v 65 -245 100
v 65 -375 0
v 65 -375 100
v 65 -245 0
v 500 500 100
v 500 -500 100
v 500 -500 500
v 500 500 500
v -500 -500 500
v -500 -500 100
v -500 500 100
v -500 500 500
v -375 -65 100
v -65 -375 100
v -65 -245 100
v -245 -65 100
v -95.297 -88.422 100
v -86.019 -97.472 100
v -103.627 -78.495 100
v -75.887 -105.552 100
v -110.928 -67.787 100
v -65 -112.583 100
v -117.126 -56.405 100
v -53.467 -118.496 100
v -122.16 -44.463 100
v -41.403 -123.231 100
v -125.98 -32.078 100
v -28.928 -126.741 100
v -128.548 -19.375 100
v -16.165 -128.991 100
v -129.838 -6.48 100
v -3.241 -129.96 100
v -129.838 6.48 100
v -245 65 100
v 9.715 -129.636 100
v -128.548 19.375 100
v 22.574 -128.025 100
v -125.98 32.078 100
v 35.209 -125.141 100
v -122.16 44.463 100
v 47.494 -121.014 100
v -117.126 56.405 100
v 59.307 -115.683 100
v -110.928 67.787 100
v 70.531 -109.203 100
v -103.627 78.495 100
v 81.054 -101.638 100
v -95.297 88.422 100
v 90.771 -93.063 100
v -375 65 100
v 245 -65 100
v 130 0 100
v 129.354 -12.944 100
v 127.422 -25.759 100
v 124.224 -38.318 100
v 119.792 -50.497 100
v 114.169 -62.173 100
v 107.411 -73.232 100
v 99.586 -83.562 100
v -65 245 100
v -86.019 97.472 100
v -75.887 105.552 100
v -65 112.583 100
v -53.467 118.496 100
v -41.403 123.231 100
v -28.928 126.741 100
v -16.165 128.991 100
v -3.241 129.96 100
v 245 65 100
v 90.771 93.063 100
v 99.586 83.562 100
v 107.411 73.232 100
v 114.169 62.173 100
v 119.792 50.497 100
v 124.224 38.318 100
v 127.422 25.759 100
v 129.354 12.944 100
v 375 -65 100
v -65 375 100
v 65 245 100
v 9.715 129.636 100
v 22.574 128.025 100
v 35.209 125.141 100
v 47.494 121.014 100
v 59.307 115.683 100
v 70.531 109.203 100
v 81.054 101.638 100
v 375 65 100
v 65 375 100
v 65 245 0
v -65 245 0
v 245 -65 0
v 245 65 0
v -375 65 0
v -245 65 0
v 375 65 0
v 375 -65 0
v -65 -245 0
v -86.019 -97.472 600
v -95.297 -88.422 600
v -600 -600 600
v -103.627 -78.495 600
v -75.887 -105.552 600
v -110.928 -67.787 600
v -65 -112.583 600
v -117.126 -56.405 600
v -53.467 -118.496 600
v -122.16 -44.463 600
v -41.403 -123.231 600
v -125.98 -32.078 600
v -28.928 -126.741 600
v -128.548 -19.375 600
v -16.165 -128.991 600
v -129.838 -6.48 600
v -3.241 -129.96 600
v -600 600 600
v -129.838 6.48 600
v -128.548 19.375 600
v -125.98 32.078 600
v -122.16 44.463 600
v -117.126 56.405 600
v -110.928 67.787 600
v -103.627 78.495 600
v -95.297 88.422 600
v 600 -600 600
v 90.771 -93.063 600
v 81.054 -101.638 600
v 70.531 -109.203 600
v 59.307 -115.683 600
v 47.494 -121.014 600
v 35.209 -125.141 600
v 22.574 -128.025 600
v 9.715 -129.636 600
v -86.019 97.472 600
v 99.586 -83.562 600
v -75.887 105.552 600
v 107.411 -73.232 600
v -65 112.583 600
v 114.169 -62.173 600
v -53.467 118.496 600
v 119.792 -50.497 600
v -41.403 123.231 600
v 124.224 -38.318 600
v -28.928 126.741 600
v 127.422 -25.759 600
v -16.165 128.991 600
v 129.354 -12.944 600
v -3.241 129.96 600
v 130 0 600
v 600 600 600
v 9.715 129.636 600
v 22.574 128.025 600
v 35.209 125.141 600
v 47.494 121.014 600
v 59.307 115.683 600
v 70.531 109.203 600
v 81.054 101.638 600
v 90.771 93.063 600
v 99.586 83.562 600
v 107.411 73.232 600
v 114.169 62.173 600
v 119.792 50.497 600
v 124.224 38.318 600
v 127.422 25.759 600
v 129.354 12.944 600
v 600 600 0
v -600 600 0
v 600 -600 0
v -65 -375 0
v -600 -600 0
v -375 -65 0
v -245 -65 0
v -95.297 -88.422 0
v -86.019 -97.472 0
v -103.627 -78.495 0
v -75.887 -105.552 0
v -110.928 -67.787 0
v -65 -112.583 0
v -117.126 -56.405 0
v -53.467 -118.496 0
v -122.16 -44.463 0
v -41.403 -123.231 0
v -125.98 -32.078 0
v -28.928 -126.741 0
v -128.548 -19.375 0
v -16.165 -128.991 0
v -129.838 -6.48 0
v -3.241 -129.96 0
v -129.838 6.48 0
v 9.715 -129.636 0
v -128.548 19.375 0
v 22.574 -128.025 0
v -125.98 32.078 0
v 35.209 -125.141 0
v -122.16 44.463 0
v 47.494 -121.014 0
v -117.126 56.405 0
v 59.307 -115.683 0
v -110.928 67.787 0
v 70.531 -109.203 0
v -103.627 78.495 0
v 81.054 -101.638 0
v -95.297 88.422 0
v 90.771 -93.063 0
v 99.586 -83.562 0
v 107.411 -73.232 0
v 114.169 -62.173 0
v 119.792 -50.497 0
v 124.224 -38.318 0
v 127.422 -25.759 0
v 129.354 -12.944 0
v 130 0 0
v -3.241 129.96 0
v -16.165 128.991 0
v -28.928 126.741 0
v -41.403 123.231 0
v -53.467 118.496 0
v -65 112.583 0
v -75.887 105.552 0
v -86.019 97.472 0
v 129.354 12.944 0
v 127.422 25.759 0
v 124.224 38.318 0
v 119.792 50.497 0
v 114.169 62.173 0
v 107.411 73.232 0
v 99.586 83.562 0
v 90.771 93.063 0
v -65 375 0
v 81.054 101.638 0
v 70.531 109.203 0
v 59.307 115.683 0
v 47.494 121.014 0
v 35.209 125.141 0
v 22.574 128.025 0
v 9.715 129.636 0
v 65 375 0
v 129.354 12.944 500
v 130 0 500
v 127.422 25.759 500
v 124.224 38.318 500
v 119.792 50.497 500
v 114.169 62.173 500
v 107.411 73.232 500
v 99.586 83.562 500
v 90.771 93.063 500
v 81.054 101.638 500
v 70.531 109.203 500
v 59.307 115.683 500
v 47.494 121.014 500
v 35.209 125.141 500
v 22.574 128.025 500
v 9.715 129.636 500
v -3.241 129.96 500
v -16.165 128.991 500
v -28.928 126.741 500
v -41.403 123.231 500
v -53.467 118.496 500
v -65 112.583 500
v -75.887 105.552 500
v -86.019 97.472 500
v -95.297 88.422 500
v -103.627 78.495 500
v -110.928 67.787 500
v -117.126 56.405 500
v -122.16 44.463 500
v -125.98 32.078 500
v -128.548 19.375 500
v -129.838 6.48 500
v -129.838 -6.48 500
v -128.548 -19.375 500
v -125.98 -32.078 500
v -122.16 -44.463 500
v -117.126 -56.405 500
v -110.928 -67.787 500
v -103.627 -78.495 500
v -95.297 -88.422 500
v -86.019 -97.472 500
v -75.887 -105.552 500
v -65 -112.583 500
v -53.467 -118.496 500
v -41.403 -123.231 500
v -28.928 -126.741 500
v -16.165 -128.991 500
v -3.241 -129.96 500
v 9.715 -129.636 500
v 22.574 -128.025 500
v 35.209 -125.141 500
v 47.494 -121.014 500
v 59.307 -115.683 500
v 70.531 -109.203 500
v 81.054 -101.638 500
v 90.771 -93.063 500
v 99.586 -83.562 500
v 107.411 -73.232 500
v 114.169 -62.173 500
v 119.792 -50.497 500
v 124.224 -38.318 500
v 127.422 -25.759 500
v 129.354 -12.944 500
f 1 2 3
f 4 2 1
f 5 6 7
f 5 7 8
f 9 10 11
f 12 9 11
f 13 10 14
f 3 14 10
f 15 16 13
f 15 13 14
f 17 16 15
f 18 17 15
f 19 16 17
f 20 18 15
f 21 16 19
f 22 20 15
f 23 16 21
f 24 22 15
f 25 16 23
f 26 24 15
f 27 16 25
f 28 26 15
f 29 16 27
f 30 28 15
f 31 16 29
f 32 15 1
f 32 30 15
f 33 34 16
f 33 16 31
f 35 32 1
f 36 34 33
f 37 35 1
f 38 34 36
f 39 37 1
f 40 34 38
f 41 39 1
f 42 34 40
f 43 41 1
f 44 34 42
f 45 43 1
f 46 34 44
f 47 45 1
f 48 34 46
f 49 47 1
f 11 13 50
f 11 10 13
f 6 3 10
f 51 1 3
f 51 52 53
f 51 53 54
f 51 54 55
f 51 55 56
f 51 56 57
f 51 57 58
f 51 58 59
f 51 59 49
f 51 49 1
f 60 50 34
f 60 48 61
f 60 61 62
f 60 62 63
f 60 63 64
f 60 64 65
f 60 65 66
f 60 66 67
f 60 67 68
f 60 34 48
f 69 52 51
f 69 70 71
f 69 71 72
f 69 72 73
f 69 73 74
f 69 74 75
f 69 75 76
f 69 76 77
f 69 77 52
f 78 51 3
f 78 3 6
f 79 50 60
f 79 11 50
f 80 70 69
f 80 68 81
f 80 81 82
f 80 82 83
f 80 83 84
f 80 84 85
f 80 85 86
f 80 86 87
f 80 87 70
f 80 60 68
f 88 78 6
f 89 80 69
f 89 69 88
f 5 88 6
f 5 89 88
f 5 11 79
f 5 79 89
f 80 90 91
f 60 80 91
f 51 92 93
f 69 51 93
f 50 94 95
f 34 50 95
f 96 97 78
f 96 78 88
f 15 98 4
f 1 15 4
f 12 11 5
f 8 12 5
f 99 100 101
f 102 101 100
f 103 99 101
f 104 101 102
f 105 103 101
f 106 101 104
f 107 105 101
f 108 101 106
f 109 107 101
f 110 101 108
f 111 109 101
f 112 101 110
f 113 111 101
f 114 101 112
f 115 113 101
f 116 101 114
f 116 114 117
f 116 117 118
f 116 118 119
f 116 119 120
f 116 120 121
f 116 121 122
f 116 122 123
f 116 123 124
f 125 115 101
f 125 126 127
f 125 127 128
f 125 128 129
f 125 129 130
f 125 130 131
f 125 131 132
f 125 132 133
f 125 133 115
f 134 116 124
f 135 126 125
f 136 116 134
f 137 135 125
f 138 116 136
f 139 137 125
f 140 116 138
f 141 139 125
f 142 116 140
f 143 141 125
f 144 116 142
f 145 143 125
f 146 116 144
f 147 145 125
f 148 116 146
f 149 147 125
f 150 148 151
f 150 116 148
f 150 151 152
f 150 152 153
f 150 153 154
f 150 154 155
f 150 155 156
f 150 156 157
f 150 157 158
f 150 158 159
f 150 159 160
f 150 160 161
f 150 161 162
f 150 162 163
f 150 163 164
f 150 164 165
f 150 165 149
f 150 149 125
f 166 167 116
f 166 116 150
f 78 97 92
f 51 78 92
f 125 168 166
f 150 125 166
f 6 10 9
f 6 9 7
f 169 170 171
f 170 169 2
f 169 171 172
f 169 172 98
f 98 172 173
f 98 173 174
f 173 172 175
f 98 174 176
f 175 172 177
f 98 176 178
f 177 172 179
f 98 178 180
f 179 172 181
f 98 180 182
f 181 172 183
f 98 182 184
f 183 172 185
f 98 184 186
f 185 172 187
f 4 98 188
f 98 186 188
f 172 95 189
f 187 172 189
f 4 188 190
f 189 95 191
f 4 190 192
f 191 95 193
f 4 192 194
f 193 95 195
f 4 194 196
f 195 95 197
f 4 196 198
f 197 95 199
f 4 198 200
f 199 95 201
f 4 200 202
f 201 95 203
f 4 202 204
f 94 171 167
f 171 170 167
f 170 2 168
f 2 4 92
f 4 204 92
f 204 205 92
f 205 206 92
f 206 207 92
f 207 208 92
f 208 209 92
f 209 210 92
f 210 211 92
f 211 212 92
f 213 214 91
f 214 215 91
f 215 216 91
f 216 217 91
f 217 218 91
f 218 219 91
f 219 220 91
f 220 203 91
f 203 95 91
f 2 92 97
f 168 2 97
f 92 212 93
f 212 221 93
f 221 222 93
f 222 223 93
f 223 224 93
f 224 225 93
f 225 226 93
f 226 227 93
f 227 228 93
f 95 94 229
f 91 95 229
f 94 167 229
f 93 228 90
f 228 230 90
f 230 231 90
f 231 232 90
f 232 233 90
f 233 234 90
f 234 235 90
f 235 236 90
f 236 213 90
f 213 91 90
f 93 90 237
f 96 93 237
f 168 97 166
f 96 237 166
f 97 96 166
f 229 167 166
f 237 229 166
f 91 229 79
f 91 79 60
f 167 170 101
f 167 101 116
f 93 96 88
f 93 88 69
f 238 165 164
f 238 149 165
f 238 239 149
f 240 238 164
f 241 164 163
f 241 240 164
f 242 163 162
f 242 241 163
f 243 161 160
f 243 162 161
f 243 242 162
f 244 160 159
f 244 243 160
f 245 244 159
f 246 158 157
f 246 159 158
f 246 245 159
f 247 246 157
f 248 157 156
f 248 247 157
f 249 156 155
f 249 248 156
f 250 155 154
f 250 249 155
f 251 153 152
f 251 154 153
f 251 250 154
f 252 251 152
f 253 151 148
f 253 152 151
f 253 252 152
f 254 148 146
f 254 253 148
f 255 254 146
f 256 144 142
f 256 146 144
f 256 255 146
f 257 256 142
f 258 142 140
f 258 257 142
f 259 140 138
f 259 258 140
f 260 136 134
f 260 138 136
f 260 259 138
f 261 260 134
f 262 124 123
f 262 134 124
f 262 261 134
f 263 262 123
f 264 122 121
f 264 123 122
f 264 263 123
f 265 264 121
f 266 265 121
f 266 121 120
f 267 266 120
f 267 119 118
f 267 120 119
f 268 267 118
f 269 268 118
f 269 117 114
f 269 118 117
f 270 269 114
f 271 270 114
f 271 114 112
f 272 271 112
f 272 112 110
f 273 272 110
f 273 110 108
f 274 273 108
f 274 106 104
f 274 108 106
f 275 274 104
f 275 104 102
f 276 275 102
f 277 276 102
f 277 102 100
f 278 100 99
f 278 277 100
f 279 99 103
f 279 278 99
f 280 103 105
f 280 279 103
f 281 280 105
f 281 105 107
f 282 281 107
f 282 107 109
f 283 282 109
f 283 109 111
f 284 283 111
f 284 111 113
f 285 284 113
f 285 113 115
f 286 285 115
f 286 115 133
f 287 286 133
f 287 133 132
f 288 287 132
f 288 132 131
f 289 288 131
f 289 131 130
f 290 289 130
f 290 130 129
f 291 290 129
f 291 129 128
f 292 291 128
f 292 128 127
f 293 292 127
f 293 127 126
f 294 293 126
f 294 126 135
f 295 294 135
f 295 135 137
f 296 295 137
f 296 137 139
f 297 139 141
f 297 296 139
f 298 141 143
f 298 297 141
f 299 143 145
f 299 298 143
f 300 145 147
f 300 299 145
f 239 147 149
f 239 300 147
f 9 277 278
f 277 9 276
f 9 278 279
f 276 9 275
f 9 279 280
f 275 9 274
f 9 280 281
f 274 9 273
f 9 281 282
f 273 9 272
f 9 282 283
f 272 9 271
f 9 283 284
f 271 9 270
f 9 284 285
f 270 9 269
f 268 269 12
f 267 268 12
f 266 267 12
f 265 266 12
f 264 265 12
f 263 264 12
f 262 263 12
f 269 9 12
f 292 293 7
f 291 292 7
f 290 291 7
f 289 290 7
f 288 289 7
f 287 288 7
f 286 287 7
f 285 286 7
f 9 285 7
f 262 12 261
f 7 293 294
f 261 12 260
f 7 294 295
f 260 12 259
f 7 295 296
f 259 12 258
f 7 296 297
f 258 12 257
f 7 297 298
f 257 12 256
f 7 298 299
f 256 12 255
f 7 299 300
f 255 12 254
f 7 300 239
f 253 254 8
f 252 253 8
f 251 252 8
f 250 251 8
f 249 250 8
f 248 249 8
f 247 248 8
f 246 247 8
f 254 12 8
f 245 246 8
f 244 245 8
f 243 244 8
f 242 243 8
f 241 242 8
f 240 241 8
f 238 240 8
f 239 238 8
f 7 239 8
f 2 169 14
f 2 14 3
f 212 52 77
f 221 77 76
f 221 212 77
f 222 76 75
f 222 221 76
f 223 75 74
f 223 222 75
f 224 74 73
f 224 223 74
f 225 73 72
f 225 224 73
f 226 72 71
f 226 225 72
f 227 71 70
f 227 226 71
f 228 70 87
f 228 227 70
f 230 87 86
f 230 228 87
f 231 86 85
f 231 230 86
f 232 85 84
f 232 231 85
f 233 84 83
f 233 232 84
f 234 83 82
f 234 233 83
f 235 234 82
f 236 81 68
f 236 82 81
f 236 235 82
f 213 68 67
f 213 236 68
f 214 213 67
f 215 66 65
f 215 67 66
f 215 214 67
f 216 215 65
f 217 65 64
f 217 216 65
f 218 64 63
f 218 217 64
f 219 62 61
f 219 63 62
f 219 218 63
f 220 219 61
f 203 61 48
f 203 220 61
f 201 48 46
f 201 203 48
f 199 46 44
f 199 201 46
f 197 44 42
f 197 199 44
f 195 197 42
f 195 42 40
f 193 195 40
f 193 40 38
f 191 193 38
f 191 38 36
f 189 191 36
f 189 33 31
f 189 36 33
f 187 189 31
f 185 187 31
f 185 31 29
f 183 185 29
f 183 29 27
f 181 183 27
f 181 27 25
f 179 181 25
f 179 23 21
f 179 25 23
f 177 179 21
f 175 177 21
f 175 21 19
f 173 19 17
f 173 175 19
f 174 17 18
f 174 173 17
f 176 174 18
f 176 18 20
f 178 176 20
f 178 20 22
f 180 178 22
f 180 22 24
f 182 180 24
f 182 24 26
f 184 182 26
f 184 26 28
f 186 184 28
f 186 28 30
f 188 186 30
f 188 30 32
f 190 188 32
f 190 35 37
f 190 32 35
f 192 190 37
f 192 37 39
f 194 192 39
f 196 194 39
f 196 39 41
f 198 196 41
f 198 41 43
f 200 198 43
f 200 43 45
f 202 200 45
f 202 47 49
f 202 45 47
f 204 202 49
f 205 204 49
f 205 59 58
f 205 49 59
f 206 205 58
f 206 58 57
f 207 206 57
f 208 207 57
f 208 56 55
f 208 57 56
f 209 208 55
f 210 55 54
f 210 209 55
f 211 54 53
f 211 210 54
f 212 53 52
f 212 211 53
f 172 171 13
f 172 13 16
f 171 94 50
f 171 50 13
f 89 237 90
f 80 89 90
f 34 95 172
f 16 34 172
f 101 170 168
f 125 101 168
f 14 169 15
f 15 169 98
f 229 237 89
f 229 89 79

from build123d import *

# Parameters (mm, degrees)
SKETCH2_W           = 1200
SKETCH2_H           = 1200
BOSS_EXTRUDE1_DEPTH = 600
SHELL1_T            = -100
SKETCH3_W           = 1200
SKETCH3_H           = 1200
BOSS_EXTRUDE2_DEPTH = 100
SKETCH4_R           = 130
CUT_EXTRUDE1_DEPTH  = 601
SKETCH5_W           = 130
SKETCH5_H           = 130
CUT_EXTRUDE2_DEPTH  = 150
CIRPATTERN2_COUNT   = 4


with BuildPart() as part:
    # Sketch2 → Boss-Extrude1 (new body)
    with BuildSketch(Plane.XY):
        Rectangle(SKETCH2_W, SKETCH2_H)
    extrude(amount=BOSS_EXTRUDE1_DEPTH)

    # Shell1
    shell1_openings = [part.faces().sort_by_distance(p)[0] for p in [
        (0, 0, 600),
    ]]
    offset(amount=SHELL1_T, openings=shell1_openings, kind=Kind.INTERSECTION)

    # Sketch3 → Boss-Extrude2 (add)
    with BuildSketch(Plane.XY.offset(600)):
        Rectangle(SKETCH3_W, SKETCH3_H)
    extrude(amount=-BOSS_EXTRUDE2_DEPTH)

    # Sketch4 → Cut-Extrude1 (cut, through all)
    with BuildSketch(Plane.XY):
        Circle(SKETCH4_R)
    extrude(amount=CUT_EXTRUDE1_DEPTH, mode=Mode.SUBTRACT)

    # Sketch5 → Cut-Extrude2 (cut)
    with BuildSketch(Plane(origin=(0, 0, 0), x_dir=(-1, 0, 0), z_dir=(0, 0, -1))):
        with Locations((-310, 0)):
            Rectangle(SKETCH5_W, SKETCH5_H)
    cut_extrude2 = extrude(amount=-CUT_EXTRUDE2_DEPTH, mode=Mode.SUBTRACT)

    # CirPattern2: Cut-Extrude2 ×4 about axis
    cirpattern2_axis = Axis((0, 0, 0), (0, 0, 1))
    for i in range(1, CIRPATTERN2_COUNT):
        add(cut_extrude2.rotate(cirpattern2_axis, i * 360 / CIRPATTERN2_COUNT), mode=Mode.SUBTRACT)


solid = part.part
